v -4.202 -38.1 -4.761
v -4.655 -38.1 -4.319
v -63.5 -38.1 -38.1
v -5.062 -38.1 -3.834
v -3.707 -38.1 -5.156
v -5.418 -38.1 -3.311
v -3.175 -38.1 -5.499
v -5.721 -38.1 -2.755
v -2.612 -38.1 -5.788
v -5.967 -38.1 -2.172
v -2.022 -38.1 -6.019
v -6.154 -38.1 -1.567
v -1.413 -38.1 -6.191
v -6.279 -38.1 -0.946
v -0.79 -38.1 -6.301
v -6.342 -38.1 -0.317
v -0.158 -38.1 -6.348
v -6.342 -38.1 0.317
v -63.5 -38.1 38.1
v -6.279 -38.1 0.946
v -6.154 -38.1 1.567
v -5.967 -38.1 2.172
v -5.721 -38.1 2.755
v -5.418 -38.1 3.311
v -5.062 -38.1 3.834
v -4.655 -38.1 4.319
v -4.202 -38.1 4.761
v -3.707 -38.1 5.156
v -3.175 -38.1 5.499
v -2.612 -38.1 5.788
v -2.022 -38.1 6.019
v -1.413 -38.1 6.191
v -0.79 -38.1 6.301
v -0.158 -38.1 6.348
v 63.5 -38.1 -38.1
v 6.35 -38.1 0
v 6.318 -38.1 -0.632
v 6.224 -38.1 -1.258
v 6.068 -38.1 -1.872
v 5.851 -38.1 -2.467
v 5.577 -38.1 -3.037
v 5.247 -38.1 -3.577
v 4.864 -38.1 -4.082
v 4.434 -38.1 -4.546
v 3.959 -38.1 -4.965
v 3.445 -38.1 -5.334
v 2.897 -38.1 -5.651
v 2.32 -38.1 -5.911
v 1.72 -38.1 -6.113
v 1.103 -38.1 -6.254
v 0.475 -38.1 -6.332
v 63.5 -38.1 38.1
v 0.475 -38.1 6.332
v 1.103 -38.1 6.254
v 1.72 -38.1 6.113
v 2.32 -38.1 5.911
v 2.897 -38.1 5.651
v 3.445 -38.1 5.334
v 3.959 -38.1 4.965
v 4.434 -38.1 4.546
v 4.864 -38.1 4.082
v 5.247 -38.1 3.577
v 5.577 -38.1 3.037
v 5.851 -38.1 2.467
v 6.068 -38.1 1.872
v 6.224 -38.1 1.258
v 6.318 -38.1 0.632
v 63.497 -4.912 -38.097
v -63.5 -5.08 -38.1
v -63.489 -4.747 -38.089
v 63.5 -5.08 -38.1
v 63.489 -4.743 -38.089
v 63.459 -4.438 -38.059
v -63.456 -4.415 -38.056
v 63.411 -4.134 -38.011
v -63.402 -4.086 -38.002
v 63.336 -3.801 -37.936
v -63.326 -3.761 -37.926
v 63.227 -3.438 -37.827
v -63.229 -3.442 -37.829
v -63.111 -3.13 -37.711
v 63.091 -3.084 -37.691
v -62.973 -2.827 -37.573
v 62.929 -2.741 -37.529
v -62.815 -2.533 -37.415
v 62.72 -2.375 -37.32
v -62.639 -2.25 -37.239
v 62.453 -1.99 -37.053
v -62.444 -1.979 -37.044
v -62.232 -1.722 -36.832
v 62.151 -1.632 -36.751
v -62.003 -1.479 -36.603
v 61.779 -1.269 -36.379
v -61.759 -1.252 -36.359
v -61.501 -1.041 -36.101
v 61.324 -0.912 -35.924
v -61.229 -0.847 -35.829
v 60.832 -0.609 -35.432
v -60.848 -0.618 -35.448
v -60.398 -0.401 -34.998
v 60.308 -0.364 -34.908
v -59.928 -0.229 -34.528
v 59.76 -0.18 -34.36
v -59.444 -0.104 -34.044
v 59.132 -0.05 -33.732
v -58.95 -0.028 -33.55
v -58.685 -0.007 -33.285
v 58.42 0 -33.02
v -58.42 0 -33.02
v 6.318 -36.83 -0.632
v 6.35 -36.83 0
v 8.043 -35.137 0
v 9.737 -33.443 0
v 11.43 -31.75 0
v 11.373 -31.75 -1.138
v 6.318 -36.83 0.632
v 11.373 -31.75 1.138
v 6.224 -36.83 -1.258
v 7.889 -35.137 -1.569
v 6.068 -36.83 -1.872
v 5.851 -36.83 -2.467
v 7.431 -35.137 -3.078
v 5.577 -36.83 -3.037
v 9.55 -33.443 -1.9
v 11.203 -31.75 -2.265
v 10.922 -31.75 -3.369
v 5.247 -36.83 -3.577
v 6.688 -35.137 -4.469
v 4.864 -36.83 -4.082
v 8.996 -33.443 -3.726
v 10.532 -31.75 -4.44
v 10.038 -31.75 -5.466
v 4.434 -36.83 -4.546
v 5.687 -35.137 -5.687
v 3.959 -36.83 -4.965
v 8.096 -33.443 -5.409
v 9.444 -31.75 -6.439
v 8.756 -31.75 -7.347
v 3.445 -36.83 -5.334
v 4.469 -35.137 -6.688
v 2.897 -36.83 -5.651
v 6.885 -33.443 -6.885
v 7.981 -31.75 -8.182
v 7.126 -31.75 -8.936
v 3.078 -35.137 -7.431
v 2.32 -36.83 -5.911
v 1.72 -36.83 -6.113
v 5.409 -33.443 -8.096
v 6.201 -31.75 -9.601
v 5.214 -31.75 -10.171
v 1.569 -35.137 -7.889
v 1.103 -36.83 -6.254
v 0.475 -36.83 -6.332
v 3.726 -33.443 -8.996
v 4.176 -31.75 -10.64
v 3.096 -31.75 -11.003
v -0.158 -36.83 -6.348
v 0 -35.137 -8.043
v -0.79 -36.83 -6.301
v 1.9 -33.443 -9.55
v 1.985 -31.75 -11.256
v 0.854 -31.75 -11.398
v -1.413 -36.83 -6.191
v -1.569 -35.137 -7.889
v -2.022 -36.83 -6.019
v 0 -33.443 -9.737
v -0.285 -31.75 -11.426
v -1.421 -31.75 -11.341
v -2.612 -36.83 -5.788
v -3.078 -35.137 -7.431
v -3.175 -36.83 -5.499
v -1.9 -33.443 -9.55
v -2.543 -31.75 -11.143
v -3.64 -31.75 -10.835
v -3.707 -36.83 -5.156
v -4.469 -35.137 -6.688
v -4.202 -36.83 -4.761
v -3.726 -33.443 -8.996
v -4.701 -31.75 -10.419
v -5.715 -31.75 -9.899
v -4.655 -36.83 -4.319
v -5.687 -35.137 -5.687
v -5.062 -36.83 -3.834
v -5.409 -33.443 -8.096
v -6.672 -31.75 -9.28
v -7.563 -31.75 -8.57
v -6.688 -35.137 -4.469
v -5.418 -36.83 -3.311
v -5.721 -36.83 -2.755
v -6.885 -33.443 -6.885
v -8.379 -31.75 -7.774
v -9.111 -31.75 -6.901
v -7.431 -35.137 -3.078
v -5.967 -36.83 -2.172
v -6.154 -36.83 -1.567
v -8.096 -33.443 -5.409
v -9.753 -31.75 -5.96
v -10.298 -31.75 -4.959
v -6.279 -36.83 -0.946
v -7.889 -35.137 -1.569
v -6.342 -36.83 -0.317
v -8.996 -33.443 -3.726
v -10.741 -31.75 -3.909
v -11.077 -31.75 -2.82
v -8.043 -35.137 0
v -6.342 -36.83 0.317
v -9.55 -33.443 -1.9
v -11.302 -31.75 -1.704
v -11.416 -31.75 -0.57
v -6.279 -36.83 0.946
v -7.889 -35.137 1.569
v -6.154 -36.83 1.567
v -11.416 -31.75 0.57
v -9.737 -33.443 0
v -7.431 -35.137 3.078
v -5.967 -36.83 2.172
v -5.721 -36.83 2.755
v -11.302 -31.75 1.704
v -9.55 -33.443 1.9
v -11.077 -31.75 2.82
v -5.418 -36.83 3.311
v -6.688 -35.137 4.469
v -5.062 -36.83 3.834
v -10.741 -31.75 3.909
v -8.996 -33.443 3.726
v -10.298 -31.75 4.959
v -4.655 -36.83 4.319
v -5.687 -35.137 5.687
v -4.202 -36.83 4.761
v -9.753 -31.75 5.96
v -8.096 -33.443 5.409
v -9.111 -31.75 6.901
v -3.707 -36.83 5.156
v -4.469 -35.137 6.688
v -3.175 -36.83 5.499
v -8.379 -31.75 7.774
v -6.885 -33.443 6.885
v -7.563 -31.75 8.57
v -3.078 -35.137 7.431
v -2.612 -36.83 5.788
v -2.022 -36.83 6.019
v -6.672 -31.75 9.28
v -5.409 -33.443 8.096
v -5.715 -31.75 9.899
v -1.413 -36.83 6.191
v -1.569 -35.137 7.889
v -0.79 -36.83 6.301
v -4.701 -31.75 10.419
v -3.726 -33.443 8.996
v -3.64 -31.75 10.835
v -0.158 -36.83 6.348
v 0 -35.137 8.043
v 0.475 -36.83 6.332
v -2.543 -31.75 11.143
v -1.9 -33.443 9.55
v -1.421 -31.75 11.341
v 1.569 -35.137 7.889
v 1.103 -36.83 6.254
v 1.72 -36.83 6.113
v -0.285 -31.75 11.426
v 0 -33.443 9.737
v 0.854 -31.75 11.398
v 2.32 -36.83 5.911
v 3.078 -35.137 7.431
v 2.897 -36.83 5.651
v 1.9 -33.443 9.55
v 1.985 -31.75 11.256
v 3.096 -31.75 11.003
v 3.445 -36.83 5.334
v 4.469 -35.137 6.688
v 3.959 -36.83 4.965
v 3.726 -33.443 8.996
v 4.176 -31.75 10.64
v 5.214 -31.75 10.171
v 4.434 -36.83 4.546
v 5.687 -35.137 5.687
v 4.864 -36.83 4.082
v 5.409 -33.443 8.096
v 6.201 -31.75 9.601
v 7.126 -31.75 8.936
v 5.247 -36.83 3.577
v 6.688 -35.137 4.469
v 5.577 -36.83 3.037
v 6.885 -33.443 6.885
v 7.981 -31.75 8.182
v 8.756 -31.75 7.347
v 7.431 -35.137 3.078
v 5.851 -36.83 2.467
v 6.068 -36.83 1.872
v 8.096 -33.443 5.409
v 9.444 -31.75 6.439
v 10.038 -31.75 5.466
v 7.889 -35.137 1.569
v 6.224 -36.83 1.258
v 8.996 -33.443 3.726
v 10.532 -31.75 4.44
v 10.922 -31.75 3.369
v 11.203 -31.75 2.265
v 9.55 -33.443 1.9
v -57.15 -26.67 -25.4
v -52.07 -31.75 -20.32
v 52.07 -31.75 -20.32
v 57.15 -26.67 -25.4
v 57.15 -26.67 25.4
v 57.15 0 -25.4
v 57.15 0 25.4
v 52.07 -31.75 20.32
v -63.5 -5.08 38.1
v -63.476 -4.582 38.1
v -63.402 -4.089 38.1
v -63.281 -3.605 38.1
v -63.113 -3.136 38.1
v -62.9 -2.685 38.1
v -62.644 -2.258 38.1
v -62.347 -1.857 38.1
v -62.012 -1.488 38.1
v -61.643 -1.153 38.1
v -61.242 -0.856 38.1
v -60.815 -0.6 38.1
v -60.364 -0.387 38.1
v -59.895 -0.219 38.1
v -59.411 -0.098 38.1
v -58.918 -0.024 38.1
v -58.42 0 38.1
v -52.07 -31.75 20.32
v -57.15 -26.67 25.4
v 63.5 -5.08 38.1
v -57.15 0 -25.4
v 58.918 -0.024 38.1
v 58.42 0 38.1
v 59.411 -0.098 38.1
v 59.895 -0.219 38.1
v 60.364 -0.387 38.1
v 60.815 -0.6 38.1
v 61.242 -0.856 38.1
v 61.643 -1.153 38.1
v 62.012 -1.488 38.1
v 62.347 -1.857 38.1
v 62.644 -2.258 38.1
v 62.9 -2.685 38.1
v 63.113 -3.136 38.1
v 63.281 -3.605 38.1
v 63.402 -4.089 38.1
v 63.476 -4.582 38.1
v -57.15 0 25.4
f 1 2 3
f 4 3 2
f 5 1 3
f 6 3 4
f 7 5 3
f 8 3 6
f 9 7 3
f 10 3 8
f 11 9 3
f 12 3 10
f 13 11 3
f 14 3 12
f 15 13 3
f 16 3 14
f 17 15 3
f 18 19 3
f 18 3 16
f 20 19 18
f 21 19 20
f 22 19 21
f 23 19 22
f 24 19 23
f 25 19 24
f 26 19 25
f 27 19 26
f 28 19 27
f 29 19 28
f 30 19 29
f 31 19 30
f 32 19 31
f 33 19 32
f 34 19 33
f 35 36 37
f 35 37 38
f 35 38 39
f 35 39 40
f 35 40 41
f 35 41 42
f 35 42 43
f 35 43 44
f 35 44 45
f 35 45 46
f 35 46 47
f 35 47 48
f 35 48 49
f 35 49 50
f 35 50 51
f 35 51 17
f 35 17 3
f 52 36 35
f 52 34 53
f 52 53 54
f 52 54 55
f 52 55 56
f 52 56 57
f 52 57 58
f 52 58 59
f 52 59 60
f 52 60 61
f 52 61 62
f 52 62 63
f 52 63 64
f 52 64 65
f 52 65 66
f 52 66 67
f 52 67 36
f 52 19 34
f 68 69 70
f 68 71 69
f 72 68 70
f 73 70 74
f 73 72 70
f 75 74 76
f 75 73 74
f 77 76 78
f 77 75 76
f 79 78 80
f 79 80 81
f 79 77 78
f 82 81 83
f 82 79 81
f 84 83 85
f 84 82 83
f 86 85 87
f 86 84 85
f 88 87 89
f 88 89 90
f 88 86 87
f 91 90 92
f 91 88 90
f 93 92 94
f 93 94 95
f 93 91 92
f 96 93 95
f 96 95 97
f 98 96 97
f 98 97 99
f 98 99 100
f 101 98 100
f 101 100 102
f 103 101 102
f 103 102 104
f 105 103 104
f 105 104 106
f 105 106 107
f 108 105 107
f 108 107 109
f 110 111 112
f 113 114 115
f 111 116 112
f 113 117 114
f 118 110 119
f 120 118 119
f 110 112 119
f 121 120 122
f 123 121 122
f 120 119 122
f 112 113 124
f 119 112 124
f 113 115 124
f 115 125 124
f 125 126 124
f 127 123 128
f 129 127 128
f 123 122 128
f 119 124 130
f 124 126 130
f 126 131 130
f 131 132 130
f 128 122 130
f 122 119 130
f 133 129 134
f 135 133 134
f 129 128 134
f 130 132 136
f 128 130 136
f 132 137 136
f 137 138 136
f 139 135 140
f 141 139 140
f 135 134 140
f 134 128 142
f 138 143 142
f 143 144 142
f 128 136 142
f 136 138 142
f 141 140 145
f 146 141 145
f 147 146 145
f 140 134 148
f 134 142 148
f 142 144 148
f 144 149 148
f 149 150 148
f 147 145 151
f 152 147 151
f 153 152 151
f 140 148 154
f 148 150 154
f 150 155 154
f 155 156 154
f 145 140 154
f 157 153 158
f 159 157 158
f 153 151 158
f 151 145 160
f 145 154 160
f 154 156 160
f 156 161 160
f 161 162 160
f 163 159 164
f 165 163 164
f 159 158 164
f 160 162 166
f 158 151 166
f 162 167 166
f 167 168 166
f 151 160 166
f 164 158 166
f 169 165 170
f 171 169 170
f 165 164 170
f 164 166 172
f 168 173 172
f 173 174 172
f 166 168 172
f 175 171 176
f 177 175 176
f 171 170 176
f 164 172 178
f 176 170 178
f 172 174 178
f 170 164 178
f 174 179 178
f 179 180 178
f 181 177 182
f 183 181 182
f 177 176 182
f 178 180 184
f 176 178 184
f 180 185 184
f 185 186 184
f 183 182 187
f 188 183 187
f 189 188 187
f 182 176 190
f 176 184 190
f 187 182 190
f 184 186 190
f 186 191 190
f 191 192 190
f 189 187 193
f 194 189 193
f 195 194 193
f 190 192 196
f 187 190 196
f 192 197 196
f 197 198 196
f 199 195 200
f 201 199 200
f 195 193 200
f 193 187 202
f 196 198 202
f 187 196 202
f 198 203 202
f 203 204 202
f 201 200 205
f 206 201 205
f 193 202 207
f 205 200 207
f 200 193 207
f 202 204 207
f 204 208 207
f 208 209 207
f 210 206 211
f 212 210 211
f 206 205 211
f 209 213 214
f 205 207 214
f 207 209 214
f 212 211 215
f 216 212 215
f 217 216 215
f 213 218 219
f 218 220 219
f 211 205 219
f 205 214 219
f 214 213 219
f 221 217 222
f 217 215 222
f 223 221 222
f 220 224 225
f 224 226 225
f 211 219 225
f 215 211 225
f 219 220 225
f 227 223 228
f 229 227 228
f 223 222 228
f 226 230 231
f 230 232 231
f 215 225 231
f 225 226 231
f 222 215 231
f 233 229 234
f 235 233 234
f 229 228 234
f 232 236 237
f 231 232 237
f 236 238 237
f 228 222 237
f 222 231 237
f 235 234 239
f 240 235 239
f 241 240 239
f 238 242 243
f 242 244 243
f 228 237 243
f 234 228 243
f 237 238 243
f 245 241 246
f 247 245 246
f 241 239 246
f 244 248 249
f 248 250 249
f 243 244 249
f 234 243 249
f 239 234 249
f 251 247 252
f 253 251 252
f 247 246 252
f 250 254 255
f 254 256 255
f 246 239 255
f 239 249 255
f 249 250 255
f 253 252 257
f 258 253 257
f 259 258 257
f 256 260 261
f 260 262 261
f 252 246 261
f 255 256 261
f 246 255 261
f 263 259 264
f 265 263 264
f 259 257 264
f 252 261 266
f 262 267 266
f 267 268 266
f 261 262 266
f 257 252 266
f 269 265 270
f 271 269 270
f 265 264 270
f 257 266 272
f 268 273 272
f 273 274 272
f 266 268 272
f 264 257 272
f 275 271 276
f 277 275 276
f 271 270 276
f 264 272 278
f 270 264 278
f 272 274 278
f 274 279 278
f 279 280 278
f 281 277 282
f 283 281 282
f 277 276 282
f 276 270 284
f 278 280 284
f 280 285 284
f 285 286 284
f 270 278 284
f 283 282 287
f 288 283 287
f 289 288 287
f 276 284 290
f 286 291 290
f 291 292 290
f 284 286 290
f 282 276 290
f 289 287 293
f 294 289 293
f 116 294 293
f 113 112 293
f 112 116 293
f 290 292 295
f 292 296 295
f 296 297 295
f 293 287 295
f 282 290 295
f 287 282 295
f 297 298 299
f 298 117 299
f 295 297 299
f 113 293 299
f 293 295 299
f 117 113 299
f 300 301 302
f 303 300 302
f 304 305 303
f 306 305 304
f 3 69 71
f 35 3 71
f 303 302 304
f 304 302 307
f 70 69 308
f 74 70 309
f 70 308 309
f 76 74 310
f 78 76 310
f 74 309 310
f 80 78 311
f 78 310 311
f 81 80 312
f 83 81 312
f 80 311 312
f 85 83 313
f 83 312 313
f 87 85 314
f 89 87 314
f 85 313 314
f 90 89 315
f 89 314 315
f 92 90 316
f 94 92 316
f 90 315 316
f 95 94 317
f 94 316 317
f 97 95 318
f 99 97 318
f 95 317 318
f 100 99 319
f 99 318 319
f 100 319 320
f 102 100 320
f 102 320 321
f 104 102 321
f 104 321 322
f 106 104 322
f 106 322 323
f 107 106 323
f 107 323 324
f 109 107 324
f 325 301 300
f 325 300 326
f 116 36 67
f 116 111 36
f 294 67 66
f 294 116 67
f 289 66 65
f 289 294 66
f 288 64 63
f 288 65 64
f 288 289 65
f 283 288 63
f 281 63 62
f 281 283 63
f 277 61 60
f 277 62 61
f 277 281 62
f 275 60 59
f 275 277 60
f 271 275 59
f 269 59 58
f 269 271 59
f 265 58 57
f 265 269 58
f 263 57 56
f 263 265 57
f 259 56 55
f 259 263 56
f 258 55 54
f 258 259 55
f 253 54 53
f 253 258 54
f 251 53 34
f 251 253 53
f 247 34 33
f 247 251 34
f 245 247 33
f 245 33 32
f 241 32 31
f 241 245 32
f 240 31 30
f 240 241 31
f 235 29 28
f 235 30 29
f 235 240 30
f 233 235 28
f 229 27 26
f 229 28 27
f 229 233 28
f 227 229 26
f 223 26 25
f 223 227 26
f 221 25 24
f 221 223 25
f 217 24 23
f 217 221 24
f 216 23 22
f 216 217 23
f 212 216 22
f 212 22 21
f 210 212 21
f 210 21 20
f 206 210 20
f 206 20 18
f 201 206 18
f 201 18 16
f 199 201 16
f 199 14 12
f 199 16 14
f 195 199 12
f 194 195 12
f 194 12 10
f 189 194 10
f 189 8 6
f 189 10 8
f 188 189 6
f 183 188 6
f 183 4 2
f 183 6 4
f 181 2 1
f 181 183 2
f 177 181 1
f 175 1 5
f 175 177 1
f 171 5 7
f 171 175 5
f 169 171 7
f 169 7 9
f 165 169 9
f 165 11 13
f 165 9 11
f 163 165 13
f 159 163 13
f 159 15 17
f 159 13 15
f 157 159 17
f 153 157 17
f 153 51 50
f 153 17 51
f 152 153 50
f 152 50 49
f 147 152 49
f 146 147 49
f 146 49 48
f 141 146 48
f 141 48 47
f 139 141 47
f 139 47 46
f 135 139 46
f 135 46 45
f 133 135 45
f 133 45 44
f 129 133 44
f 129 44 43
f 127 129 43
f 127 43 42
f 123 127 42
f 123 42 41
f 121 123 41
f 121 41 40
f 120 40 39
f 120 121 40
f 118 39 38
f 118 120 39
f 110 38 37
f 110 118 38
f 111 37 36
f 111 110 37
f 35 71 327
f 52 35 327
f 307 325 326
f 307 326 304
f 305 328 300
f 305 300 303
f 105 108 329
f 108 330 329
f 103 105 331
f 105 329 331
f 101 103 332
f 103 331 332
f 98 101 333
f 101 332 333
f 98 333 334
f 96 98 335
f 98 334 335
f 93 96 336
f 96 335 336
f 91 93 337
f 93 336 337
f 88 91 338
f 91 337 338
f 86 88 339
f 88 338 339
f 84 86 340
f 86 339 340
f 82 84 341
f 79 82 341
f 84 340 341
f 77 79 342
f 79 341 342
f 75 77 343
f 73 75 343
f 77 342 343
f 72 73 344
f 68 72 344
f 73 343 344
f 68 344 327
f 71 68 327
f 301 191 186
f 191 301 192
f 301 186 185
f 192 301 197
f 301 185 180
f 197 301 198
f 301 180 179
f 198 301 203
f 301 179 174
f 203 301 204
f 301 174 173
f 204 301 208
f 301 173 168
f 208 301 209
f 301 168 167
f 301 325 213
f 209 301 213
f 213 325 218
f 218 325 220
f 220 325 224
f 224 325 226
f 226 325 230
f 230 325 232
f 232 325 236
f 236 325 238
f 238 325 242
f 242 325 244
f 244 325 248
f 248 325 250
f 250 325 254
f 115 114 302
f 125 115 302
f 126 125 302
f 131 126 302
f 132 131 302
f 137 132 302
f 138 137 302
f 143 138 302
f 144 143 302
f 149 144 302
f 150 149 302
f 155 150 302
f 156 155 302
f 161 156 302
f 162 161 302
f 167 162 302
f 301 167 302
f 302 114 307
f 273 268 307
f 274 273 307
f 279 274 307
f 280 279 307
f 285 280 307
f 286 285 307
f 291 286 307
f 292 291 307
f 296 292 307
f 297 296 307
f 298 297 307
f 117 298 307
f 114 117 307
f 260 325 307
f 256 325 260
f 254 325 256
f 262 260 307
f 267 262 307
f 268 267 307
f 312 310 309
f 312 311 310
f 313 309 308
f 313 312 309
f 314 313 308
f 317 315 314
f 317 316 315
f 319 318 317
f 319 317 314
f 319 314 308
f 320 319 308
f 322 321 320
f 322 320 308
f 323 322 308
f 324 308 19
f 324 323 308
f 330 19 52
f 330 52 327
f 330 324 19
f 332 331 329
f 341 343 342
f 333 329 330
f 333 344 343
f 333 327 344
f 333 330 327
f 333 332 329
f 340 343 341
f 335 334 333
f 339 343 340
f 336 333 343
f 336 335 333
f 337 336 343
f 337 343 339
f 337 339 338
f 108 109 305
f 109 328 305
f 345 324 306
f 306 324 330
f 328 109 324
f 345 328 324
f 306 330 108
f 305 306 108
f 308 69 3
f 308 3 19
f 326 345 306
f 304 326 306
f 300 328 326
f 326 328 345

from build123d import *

# Parameters (mm, degrees)
F0_W     = 127
F0_H     = 76.2
F1_DEPTH = 38.1
F2_R     = 6.35
F3_DEPTH = 50.8
F4_R     = 5.08
F5_W     = 114.3
F5_H     = 50.8
F6_DEPTH = 31.75
F7_SIZE  = 5.08


with BuildPart() as f1:
    # F0 (on Front) → F1 (new body)
    with BuildSketch(Plane.XZ):
        Rectangle(F0_W, F0_H)
    extrude(amount=F1_DEPTH)

    # F2 (on Front) → F3 (cut)
    with BuildSketch(Plane.XZ):
        Circle(F2_R)
    extrude(amount=F3_DEPTH, mode=Mode.SUBTRACT)

    # F4
    f4_edges = [f1.edges().sort_by_distance(p)[0] for p in [
        (63.5, 0, 0),
        (0, 0, -38.1),
        (-63.5, 0, 0),
    ]]
    fillet(f4_edges, radius=F4_R)

    # F5 (on Front) → F6 (cut)
    with BuildSketch(Plane.XZ):
        Rectangle(F5_W, F5_H)
    extrude(amount=F6_DEPTH, mode=Mode.SUBTRACT)

    # F7
    f7_edges = [f1.edges().sort_by_distance(p)[0] for p in [
        (-6.35, -31.75, 0),
        (0, -31.75, 25.4),
        (57.15, -31.75, 0),
        (-57.15, -31.75, 0),
        (0, -31.75, -25.4),
    ]]
    chamfer(f7_edges, length=F7_SIZE)


solid = f1.part
